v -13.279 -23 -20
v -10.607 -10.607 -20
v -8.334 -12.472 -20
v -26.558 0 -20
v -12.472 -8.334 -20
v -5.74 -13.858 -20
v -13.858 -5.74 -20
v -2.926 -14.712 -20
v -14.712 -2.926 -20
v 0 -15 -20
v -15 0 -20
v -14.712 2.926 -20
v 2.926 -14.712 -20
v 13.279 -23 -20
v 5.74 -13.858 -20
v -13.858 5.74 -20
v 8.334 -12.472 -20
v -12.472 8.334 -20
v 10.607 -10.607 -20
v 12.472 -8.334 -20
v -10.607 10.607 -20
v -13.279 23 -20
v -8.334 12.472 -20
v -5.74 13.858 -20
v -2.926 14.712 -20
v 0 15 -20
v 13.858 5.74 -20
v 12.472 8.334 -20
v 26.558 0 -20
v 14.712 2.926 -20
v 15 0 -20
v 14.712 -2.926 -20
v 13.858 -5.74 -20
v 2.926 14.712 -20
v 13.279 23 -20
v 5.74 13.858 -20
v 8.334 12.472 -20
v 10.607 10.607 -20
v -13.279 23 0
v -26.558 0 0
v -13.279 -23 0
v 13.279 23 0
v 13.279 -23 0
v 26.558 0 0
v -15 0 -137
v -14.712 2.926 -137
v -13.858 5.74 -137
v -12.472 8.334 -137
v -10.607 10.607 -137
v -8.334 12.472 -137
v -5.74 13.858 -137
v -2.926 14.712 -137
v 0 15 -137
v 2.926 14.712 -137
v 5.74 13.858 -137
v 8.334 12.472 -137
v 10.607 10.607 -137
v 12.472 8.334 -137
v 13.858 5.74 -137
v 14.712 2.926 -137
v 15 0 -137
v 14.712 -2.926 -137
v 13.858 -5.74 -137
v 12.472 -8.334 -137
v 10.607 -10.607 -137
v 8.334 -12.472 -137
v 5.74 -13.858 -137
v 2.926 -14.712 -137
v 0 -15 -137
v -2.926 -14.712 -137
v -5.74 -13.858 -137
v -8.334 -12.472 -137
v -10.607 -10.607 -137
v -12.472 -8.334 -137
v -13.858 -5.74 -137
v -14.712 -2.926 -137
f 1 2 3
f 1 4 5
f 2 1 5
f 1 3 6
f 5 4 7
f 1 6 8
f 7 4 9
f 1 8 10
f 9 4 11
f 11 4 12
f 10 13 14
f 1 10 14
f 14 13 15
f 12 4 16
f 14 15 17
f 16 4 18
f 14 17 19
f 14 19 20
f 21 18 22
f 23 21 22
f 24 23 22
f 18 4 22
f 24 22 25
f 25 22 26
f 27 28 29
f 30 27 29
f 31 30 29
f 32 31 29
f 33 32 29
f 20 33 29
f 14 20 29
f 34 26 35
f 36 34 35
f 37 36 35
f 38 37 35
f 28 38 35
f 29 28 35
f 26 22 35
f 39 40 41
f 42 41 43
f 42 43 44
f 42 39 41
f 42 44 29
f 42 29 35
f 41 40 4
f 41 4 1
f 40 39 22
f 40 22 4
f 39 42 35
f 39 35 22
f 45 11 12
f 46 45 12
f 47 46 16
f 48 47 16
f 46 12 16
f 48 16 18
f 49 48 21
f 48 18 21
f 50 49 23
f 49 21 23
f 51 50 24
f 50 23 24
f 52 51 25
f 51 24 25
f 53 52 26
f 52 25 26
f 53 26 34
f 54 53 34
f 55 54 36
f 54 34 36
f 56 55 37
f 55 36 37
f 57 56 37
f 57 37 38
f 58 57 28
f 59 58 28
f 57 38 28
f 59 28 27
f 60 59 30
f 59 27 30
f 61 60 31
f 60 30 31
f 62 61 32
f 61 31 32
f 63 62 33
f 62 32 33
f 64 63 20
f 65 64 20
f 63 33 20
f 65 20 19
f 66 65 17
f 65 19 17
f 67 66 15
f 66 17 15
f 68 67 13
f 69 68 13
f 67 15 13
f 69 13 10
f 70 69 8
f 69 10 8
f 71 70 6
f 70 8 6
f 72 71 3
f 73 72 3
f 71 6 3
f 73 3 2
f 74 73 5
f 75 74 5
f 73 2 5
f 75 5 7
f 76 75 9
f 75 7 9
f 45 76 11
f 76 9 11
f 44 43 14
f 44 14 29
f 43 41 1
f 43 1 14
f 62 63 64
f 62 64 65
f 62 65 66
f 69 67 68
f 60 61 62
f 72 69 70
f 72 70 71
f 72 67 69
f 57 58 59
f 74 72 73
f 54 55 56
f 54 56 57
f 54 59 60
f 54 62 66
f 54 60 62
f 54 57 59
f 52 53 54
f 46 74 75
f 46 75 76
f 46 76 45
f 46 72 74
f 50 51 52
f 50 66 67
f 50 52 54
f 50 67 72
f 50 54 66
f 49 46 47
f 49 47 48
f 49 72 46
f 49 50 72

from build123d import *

# Parameters (mm, degrees)
BOSS_EXTRUDE1_DEPTH = 20
SKETCH2_R           = 15
BOSS_EXTRUDE2_DEPTH = 117


with BuildPart() as part:
    # Sketch1 → Boss-Extrude1 (new body)
    with BuildSketch(Plane.XY):
        Polygon((26.558112383, 0), (13.279056191, 23), (-13.279056191, 23), (-26.558112383, 0), (-13.279056191, -23), (13.279056191, -23), align=None)
    extrude(amount=-BOSS_EXTRUDE1_DEPTH)

    # Sketch2 → Boss-Extrude2 (add)
    with BuildSketch(Plane(origin=(0, 0, -20), x_dir=(-1, 0, 0), z_dir=(0, 0, -1))):
        Circle(SKETCH2_R)
    extrude(amount=BOSS_EXTRUDE2_DEPTH)


solid = part.part
